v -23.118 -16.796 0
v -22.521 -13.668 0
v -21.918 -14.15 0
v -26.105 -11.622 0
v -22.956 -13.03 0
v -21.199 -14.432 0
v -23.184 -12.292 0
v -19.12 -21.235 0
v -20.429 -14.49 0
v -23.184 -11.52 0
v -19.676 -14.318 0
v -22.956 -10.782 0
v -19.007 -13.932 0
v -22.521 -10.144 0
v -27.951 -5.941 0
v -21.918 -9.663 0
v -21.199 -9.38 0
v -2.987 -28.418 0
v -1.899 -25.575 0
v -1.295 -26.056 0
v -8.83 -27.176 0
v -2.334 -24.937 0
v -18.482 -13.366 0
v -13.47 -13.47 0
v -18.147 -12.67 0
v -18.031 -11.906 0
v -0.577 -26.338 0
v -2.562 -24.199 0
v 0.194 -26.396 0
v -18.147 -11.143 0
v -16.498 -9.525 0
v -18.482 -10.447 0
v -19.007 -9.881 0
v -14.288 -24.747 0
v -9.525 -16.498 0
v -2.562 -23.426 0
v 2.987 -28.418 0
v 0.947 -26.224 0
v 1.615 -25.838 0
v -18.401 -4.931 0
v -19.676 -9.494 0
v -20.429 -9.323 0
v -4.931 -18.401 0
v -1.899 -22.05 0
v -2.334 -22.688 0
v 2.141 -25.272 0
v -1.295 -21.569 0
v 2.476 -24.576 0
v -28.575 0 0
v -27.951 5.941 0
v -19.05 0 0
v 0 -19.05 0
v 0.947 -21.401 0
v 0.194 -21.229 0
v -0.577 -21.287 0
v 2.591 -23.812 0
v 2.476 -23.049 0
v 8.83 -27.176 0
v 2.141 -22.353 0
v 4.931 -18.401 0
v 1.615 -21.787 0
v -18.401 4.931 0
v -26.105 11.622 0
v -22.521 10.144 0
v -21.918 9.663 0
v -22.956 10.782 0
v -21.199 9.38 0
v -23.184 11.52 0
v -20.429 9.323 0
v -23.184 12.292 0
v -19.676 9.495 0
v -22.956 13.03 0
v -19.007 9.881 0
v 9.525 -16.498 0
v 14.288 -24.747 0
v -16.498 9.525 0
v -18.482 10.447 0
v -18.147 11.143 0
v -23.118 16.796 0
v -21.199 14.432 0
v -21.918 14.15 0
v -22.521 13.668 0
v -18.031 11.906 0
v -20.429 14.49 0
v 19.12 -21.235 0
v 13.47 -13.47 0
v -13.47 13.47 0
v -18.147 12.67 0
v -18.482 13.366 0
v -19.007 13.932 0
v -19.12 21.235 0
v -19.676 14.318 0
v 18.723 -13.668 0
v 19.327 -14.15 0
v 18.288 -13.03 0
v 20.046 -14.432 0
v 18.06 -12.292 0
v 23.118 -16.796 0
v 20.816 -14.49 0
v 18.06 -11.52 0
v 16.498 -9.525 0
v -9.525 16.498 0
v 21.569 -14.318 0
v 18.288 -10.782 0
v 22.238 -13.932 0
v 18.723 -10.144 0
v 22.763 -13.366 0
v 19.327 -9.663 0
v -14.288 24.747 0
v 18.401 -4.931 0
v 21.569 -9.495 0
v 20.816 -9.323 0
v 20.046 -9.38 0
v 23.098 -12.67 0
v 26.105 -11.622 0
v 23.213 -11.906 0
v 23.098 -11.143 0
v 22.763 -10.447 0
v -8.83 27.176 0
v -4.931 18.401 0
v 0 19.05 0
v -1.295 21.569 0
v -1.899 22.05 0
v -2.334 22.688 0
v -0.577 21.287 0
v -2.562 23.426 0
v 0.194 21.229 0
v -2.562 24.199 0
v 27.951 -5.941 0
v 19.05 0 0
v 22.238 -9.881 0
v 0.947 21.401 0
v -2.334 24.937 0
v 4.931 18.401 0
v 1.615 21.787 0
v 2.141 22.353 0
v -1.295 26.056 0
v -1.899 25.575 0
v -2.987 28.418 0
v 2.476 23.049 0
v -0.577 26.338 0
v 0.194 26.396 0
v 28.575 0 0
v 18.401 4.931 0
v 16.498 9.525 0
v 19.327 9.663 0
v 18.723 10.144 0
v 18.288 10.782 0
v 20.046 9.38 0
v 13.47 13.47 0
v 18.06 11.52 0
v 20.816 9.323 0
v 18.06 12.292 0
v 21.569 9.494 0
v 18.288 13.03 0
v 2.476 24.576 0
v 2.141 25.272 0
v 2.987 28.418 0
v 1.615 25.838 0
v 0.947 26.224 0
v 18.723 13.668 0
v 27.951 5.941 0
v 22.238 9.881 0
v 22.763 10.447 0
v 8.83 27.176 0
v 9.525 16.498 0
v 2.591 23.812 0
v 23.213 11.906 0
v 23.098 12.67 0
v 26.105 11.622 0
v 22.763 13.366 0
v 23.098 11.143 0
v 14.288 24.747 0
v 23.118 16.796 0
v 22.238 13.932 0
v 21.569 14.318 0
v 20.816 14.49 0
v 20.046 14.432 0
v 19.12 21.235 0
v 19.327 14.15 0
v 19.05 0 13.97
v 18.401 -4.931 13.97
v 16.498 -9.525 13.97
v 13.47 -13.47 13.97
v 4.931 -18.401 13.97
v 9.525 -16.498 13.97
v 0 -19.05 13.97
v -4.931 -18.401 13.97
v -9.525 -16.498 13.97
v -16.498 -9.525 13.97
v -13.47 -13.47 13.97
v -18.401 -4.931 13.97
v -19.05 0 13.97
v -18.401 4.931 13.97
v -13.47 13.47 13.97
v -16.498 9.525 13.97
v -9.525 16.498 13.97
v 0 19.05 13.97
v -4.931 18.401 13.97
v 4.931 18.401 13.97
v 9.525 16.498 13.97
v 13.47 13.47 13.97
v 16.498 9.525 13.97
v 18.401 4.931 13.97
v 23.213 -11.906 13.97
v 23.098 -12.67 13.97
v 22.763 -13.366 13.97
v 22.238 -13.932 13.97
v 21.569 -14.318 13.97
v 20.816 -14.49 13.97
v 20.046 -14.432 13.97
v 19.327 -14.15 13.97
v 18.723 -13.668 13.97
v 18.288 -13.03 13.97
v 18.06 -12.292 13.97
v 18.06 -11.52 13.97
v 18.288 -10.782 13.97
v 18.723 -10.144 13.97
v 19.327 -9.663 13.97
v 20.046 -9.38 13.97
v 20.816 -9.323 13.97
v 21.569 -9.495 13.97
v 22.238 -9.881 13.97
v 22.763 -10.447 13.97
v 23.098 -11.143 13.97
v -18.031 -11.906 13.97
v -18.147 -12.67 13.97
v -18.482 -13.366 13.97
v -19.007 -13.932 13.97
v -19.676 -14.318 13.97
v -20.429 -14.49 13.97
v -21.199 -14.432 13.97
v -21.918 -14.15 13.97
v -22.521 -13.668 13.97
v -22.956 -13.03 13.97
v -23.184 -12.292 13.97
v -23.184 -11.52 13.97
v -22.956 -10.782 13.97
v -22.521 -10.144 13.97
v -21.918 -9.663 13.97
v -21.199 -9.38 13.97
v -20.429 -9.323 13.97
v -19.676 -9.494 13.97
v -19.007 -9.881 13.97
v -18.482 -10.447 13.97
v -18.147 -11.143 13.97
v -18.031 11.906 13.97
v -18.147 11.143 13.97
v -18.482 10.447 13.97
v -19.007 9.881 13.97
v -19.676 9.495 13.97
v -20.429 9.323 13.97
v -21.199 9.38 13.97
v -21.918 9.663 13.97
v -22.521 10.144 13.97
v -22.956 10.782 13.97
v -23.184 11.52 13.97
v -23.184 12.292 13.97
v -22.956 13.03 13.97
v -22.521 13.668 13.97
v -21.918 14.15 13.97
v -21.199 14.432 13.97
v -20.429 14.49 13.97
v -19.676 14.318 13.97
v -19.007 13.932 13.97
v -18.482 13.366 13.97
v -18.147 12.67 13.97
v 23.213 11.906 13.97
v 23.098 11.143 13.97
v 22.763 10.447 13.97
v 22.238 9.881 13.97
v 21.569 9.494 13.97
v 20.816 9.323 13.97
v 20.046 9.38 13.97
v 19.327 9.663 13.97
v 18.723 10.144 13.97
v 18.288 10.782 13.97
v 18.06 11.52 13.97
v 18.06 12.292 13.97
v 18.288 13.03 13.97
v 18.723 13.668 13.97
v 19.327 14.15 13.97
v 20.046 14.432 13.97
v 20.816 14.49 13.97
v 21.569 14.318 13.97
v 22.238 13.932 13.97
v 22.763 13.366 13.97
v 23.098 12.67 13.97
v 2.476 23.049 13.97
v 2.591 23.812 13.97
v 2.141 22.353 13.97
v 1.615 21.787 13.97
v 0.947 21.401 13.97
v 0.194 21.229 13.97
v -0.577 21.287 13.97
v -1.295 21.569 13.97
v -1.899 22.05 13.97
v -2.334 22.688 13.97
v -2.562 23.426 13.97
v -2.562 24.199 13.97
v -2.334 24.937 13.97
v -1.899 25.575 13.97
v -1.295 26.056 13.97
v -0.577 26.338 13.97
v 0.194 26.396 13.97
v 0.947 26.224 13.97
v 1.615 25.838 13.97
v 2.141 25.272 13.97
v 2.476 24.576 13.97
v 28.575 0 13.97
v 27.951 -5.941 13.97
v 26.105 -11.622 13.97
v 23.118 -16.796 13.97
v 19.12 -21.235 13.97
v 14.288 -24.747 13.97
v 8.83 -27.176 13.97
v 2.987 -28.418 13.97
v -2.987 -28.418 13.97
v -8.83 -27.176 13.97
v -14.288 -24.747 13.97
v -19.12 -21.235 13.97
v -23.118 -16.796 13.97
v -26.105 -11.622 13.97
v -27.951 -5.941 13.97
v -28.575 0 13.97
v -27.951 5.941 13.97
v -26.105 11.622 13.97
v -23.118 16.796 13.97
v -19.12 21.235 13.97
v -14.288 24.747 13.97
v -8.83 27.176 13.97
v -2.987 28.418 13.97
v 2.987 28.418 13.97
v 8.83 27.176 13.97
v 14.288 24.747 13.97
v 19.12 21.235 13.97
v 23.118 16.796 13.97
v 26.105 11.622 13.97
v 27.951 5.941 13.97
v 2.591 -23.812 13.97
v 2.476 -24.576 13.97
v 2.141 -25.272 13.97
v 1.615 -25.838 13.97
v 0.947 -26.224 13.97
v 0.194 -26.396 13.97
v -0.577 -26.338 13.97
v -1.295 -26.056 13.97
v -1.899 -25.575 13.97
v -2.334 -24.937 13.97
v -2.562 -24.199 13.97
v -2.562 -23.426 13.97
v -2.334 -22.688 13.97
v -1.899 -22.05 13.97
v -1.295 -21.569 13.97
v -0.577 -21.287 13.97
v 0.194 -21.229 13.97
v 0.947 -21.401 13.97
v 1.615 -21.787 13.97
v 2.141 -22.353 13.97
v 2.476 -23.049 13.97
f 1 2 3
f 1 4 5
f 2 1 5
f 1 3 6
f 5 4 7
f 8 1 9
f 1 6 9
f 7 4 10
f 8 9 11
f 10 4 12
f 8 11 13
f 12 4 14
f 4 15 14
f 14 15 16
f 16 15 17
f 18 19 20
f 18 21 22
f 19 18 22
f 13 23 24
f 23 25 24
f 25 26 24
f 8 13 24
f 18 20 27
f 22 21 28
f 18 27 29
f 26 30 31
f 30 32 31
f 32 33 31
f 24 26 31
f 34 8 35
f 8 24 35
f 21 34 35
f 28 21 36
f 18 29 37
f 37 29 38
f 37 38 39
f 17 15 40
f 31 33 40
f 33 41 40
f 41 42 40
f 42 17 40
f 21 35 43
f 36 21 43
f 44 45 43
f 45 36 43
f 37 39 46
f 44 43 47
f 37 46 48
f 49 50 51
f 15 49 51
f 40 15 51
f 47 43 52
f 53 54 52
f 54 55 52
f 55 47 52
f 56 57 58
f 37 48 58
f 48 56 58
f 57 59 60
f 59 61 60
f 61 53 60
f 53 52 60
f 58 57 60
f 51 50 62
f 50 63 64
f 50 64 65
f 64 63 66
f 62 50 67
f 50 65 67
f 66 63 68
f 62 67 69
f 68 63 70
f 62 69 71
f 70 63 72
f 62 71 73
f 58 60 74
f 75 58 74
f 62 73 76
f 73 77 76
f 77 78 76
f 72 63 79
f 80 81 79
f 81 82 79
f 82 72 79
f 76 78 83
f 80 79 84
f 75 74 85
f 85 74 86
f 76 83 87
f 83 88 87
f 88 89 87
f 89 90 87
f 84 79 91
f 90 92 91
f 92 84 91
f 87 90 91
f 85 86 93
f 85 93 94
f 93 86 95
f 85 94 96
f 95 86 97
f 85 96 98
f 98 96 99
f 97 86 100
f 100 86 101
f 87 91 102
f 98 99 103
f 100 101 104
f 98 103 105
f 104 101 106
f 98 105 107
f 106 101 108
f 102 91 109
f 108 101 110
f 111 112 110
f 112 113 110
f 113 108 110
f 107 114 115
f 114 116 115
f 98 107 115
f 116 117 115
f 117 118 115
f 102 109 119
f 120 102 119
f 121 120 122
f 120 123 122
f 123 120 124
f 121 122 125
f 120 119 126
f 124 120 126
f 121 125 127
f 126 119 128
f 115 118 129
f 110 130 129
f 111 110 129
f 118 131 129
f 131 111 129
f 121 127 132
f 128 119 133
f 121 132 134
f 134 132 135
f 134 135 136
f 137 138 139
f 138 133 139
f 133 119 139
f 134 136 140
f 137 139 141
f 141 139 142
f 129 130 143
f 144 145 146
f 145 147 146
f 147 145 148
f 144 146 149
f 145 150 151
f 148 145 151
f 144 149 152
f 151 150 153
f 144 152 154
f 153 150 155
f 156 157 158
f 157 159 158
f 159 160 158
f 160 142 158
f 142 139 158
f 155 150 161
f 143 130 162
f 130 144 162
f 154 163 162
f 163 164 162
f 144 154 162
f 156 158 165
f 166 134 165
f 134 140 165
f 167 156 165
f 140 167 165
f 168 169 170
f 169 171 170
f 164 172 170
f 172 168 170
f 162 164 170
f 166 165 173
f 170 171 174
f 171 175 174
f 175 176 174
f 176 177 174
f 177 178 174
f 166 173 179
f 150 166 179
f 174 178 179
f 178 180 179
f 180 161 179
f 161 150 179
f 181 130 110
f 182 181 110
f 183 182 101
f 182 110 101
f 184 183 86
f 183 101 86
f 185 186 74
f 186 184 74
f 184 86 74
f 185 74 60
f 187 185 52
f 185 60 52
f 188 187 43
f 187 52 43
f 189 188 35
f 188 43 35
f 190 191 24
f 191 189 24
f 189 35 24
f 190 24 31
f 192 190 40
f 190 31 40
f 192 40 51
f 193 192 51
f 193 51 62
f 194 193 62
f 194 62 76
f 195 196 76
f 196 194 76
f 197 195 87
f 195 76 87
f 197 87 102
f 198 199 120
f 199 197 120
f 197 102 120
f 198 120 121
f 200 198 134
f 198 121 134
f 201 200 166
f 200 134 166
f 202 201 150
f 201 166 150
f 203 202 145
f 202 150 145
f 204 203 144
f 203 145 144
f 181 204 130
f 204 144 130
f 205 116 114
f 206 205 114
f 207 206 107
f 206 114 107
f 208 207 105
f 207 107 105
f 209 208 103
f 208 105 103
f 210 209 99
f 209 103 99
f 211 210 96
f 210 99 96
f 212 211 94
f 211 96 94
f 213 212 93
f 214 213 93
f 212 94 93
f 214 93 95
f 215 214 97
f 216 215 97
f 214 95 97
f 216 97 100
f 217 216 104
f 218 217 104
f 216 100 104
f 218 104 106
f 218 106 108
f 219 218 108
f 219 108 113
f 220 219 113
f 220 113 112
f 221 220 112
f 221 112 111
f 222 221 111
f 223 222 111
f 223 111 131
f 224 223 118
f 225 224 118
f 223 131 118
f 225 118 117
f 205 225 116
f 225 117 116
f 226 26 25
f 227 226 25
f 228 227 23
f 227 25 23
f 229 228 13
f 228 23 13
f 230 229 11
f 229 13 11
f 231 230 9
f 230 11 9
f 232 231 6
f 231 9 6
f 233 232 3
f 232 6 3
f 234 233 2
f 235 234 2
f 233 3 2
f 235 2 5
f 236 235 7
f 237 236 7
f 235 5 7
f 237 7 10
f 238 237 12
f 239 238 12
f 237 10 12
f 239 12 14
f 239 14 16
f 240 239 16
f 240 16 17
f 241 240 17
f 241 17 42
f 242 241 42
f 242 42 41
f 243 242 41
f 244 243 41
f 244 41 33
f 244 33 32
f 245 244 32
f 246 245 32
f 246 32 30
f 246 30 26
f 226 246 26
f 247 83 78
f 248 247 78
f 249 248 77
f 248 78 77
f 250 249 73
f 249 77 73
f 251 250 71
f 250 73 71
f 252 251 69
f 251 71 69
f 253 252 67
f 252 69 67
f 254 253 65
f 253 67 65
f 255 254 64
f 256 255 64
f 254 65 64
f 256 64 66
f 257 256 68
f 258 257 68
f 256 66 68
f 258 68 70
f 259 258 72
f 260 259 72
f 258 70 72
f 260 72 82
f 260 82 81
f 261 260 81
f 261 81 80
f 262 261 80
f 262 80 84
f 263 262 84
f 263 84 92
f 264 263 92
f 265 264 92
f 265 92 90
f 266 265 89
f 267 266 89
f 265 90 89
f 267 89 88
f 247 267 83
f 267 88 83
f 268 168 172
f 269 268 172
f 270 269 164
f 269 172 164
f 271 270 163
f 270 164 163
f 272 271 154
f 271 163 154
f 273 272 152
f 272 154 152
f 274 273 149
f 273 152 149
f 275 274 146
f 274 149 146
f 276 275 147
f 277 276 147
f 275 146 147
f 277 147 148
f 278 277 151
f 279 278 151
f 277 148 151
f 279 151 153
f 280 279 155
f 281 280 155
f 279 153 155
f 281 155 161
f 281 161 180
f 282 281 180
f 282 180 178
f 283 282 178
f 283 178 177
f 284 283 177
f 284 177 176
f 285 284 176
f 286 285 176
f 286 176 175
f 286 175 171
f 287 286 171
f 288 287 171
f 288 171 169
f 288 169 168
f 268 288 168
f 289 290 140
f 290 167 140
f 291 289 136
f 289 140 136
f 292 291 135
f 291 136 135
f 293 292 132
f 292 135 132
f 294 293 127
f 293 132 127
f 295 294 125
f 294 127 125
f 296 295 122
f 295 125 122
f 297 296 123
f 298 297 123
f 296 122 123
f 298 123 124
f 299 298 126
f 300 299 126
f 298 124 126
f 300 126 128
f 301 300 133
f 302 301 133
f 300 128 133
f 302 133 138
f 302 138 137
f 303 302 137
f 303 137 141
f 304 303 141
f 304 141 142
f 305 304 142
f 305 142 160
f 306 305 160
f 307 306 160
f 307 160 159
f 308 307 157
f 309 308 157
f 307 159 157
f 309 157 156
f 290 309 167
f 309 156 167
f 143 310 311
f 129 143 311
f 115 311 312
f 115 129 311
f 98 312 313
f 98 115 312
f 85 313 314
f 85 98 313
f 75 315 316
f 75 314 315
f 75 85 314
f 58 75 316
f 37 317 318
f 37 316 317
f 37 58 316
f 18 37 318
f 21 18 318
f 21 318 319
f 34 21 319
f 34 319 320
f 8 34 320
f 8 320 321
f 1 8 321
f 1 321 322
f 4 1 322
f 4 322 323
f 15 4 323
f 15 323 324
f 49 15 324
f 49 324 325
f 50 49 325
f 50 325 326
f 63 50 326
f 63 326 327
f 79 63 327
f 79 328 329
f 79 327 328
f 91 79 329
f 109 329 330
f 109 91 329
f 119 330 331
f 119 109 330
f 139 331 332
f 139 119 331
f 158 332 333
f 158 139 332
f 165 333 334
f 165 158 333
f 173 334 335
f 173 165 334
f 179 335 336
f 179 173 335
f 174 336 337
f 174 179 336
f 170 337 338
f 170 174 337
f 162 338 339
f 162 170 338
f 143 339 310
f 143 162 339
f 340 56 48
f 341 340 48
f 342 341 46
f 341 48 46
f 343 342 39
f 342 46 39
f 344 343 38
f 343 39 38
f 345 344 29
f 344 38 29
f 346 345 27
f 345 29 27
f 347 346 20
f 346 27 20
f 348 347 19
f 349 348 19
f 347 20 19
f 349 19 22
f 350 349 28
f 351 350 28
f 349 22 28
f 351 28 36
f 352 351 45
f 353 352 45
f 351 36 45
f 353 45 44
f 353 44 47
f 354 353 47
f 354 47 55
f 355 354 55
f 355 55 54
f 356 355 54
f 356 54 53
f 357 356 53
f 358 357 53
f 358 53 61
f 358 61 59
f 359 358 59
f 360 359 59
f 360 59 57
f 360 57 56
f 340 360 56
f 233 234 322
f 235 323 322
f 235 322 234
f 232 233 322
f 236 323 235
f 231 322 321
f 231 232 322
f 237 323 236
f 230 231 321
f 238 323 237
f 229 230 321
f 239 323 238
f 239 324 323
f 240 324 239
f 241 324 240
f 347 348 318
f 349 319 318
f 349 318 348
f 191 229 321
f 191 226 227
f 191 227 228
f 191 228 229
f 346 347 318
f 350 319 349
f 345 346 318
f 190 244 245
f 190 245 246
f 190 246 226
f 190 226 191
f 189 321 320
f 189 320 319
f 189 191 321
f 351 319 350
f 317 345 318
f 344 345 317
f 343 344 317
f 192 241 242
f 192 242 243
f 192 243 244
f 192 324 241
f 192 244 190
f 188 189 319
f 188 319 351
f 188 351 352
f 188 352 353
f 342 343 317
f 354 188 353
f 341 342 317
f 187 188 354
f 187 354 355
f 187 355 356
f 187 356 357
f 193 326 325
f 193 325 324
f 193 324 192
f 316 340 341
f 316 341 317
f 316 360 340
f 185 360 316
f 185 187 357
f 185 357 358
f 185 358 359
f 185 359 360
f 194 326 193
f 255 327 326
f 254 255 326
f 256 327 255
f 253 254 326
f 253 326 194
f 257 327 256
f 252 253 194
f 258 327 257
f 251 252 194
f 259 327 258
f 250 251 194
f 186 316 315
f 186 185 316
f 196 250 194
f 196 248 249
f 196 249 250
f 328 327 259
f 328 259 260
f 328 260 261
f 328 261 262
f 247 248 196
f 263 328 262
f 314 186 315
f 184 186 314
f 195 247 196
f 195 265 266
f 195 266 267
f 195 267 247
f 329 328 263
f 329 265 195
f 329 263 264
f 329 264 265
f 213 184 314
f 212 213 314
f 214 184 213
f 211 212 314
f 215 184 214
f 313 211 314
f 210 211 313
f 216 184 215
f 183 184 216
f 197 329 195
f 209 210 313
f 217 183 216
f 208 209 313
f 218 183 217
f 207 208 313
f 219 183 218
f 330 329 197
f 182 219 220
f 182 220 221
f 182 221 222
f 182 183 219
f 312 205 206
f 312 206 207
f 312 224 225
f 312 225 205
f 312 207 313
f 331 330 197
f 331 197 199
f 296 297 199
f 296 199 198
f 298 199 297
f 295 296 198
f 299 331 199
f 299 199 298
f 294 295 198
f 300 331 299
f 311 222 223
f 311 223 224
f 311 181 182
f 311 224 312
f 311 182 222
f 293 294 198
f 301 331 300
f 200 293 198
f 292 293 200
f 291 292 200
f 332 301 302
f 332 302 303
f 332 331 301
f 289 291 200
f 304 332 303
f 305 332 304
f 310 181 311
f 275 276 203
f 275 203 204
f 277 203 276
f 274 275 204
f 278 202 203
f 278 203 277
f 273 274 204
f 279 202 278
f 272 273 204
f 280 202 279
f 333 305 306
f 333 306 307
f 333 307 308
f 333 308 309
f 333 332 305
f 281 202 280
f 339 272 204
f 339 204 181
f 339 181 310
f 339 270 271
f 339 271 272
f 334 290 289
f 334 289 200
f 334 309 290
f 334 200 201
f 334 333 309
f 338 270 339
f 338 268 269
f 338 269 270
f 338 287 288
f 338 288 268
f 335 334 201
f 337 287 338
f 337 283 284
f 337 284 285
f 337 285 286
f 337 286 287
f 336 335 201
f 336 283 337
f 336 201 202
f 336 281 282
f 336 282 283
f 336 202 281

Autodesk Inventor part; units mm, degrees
ref_plane "YZ Plane" through (0, 0, 0) normal (1, 0, 0) x (0, 1, 0)
ref_plane "XZ Plane" through (0, 0, 0) normal (0, 1, 0) x (-1, 0, 0)
ref_plane "XY Plane" through (0, 0, 0) normal (0, 0, 1) x (1, 0, 0)
sketch "Sketch1" plane through (0, 0, 0) normal (0, 0, 1) x (1, 0, 0)
  circle A0 centre (0, 0) radius 28.575
  circle A1 centre (0, 0) radius 19.05
  dimension "d0" = 57.15
  dimension "d8" = 38.1
sketch "Sketch2" plane through (0, 0, 0) normal (0, 0, 1) x (1, 0, 0)
  circle A0 centre (0, 0) radius 23.8125
  circle A1 centre (0, 23.8125) radius 2.5908
  circle A2 centre (-20.6222, 11.9063) radius 2.5908
  circle A3 centre (-20.6222, -11.9062) radius 2.5908
  circle A4 centre (0, -23.8125) radius 2.5908
  circle A5 centre (20.6222, -11.9063) radius 2.5908
  circle A6 centre (20.6222, 11.9062) radius 2.5908
  dimension "d15" = 47.625
  dimension "d16" = 5.1816
  dimension "d19" = 360
extrude "Extrusion1" add sketch "Sketch1" along normal blind 13.97
extrude "Extrusion2" cut sketch "Sketch2" along normal blind 13.97 contours A6 A0 | A0 A6 | A5 A0 | A0 A5 | A1 A0 | A0 A1 | A4 A0 | A0 A4 | A2 A0 | A0 A2 | A3 A0 | A0 A3
properties part number "550 Sprocket Spacer (am-0651)" material "PC/ABS Plastic"
